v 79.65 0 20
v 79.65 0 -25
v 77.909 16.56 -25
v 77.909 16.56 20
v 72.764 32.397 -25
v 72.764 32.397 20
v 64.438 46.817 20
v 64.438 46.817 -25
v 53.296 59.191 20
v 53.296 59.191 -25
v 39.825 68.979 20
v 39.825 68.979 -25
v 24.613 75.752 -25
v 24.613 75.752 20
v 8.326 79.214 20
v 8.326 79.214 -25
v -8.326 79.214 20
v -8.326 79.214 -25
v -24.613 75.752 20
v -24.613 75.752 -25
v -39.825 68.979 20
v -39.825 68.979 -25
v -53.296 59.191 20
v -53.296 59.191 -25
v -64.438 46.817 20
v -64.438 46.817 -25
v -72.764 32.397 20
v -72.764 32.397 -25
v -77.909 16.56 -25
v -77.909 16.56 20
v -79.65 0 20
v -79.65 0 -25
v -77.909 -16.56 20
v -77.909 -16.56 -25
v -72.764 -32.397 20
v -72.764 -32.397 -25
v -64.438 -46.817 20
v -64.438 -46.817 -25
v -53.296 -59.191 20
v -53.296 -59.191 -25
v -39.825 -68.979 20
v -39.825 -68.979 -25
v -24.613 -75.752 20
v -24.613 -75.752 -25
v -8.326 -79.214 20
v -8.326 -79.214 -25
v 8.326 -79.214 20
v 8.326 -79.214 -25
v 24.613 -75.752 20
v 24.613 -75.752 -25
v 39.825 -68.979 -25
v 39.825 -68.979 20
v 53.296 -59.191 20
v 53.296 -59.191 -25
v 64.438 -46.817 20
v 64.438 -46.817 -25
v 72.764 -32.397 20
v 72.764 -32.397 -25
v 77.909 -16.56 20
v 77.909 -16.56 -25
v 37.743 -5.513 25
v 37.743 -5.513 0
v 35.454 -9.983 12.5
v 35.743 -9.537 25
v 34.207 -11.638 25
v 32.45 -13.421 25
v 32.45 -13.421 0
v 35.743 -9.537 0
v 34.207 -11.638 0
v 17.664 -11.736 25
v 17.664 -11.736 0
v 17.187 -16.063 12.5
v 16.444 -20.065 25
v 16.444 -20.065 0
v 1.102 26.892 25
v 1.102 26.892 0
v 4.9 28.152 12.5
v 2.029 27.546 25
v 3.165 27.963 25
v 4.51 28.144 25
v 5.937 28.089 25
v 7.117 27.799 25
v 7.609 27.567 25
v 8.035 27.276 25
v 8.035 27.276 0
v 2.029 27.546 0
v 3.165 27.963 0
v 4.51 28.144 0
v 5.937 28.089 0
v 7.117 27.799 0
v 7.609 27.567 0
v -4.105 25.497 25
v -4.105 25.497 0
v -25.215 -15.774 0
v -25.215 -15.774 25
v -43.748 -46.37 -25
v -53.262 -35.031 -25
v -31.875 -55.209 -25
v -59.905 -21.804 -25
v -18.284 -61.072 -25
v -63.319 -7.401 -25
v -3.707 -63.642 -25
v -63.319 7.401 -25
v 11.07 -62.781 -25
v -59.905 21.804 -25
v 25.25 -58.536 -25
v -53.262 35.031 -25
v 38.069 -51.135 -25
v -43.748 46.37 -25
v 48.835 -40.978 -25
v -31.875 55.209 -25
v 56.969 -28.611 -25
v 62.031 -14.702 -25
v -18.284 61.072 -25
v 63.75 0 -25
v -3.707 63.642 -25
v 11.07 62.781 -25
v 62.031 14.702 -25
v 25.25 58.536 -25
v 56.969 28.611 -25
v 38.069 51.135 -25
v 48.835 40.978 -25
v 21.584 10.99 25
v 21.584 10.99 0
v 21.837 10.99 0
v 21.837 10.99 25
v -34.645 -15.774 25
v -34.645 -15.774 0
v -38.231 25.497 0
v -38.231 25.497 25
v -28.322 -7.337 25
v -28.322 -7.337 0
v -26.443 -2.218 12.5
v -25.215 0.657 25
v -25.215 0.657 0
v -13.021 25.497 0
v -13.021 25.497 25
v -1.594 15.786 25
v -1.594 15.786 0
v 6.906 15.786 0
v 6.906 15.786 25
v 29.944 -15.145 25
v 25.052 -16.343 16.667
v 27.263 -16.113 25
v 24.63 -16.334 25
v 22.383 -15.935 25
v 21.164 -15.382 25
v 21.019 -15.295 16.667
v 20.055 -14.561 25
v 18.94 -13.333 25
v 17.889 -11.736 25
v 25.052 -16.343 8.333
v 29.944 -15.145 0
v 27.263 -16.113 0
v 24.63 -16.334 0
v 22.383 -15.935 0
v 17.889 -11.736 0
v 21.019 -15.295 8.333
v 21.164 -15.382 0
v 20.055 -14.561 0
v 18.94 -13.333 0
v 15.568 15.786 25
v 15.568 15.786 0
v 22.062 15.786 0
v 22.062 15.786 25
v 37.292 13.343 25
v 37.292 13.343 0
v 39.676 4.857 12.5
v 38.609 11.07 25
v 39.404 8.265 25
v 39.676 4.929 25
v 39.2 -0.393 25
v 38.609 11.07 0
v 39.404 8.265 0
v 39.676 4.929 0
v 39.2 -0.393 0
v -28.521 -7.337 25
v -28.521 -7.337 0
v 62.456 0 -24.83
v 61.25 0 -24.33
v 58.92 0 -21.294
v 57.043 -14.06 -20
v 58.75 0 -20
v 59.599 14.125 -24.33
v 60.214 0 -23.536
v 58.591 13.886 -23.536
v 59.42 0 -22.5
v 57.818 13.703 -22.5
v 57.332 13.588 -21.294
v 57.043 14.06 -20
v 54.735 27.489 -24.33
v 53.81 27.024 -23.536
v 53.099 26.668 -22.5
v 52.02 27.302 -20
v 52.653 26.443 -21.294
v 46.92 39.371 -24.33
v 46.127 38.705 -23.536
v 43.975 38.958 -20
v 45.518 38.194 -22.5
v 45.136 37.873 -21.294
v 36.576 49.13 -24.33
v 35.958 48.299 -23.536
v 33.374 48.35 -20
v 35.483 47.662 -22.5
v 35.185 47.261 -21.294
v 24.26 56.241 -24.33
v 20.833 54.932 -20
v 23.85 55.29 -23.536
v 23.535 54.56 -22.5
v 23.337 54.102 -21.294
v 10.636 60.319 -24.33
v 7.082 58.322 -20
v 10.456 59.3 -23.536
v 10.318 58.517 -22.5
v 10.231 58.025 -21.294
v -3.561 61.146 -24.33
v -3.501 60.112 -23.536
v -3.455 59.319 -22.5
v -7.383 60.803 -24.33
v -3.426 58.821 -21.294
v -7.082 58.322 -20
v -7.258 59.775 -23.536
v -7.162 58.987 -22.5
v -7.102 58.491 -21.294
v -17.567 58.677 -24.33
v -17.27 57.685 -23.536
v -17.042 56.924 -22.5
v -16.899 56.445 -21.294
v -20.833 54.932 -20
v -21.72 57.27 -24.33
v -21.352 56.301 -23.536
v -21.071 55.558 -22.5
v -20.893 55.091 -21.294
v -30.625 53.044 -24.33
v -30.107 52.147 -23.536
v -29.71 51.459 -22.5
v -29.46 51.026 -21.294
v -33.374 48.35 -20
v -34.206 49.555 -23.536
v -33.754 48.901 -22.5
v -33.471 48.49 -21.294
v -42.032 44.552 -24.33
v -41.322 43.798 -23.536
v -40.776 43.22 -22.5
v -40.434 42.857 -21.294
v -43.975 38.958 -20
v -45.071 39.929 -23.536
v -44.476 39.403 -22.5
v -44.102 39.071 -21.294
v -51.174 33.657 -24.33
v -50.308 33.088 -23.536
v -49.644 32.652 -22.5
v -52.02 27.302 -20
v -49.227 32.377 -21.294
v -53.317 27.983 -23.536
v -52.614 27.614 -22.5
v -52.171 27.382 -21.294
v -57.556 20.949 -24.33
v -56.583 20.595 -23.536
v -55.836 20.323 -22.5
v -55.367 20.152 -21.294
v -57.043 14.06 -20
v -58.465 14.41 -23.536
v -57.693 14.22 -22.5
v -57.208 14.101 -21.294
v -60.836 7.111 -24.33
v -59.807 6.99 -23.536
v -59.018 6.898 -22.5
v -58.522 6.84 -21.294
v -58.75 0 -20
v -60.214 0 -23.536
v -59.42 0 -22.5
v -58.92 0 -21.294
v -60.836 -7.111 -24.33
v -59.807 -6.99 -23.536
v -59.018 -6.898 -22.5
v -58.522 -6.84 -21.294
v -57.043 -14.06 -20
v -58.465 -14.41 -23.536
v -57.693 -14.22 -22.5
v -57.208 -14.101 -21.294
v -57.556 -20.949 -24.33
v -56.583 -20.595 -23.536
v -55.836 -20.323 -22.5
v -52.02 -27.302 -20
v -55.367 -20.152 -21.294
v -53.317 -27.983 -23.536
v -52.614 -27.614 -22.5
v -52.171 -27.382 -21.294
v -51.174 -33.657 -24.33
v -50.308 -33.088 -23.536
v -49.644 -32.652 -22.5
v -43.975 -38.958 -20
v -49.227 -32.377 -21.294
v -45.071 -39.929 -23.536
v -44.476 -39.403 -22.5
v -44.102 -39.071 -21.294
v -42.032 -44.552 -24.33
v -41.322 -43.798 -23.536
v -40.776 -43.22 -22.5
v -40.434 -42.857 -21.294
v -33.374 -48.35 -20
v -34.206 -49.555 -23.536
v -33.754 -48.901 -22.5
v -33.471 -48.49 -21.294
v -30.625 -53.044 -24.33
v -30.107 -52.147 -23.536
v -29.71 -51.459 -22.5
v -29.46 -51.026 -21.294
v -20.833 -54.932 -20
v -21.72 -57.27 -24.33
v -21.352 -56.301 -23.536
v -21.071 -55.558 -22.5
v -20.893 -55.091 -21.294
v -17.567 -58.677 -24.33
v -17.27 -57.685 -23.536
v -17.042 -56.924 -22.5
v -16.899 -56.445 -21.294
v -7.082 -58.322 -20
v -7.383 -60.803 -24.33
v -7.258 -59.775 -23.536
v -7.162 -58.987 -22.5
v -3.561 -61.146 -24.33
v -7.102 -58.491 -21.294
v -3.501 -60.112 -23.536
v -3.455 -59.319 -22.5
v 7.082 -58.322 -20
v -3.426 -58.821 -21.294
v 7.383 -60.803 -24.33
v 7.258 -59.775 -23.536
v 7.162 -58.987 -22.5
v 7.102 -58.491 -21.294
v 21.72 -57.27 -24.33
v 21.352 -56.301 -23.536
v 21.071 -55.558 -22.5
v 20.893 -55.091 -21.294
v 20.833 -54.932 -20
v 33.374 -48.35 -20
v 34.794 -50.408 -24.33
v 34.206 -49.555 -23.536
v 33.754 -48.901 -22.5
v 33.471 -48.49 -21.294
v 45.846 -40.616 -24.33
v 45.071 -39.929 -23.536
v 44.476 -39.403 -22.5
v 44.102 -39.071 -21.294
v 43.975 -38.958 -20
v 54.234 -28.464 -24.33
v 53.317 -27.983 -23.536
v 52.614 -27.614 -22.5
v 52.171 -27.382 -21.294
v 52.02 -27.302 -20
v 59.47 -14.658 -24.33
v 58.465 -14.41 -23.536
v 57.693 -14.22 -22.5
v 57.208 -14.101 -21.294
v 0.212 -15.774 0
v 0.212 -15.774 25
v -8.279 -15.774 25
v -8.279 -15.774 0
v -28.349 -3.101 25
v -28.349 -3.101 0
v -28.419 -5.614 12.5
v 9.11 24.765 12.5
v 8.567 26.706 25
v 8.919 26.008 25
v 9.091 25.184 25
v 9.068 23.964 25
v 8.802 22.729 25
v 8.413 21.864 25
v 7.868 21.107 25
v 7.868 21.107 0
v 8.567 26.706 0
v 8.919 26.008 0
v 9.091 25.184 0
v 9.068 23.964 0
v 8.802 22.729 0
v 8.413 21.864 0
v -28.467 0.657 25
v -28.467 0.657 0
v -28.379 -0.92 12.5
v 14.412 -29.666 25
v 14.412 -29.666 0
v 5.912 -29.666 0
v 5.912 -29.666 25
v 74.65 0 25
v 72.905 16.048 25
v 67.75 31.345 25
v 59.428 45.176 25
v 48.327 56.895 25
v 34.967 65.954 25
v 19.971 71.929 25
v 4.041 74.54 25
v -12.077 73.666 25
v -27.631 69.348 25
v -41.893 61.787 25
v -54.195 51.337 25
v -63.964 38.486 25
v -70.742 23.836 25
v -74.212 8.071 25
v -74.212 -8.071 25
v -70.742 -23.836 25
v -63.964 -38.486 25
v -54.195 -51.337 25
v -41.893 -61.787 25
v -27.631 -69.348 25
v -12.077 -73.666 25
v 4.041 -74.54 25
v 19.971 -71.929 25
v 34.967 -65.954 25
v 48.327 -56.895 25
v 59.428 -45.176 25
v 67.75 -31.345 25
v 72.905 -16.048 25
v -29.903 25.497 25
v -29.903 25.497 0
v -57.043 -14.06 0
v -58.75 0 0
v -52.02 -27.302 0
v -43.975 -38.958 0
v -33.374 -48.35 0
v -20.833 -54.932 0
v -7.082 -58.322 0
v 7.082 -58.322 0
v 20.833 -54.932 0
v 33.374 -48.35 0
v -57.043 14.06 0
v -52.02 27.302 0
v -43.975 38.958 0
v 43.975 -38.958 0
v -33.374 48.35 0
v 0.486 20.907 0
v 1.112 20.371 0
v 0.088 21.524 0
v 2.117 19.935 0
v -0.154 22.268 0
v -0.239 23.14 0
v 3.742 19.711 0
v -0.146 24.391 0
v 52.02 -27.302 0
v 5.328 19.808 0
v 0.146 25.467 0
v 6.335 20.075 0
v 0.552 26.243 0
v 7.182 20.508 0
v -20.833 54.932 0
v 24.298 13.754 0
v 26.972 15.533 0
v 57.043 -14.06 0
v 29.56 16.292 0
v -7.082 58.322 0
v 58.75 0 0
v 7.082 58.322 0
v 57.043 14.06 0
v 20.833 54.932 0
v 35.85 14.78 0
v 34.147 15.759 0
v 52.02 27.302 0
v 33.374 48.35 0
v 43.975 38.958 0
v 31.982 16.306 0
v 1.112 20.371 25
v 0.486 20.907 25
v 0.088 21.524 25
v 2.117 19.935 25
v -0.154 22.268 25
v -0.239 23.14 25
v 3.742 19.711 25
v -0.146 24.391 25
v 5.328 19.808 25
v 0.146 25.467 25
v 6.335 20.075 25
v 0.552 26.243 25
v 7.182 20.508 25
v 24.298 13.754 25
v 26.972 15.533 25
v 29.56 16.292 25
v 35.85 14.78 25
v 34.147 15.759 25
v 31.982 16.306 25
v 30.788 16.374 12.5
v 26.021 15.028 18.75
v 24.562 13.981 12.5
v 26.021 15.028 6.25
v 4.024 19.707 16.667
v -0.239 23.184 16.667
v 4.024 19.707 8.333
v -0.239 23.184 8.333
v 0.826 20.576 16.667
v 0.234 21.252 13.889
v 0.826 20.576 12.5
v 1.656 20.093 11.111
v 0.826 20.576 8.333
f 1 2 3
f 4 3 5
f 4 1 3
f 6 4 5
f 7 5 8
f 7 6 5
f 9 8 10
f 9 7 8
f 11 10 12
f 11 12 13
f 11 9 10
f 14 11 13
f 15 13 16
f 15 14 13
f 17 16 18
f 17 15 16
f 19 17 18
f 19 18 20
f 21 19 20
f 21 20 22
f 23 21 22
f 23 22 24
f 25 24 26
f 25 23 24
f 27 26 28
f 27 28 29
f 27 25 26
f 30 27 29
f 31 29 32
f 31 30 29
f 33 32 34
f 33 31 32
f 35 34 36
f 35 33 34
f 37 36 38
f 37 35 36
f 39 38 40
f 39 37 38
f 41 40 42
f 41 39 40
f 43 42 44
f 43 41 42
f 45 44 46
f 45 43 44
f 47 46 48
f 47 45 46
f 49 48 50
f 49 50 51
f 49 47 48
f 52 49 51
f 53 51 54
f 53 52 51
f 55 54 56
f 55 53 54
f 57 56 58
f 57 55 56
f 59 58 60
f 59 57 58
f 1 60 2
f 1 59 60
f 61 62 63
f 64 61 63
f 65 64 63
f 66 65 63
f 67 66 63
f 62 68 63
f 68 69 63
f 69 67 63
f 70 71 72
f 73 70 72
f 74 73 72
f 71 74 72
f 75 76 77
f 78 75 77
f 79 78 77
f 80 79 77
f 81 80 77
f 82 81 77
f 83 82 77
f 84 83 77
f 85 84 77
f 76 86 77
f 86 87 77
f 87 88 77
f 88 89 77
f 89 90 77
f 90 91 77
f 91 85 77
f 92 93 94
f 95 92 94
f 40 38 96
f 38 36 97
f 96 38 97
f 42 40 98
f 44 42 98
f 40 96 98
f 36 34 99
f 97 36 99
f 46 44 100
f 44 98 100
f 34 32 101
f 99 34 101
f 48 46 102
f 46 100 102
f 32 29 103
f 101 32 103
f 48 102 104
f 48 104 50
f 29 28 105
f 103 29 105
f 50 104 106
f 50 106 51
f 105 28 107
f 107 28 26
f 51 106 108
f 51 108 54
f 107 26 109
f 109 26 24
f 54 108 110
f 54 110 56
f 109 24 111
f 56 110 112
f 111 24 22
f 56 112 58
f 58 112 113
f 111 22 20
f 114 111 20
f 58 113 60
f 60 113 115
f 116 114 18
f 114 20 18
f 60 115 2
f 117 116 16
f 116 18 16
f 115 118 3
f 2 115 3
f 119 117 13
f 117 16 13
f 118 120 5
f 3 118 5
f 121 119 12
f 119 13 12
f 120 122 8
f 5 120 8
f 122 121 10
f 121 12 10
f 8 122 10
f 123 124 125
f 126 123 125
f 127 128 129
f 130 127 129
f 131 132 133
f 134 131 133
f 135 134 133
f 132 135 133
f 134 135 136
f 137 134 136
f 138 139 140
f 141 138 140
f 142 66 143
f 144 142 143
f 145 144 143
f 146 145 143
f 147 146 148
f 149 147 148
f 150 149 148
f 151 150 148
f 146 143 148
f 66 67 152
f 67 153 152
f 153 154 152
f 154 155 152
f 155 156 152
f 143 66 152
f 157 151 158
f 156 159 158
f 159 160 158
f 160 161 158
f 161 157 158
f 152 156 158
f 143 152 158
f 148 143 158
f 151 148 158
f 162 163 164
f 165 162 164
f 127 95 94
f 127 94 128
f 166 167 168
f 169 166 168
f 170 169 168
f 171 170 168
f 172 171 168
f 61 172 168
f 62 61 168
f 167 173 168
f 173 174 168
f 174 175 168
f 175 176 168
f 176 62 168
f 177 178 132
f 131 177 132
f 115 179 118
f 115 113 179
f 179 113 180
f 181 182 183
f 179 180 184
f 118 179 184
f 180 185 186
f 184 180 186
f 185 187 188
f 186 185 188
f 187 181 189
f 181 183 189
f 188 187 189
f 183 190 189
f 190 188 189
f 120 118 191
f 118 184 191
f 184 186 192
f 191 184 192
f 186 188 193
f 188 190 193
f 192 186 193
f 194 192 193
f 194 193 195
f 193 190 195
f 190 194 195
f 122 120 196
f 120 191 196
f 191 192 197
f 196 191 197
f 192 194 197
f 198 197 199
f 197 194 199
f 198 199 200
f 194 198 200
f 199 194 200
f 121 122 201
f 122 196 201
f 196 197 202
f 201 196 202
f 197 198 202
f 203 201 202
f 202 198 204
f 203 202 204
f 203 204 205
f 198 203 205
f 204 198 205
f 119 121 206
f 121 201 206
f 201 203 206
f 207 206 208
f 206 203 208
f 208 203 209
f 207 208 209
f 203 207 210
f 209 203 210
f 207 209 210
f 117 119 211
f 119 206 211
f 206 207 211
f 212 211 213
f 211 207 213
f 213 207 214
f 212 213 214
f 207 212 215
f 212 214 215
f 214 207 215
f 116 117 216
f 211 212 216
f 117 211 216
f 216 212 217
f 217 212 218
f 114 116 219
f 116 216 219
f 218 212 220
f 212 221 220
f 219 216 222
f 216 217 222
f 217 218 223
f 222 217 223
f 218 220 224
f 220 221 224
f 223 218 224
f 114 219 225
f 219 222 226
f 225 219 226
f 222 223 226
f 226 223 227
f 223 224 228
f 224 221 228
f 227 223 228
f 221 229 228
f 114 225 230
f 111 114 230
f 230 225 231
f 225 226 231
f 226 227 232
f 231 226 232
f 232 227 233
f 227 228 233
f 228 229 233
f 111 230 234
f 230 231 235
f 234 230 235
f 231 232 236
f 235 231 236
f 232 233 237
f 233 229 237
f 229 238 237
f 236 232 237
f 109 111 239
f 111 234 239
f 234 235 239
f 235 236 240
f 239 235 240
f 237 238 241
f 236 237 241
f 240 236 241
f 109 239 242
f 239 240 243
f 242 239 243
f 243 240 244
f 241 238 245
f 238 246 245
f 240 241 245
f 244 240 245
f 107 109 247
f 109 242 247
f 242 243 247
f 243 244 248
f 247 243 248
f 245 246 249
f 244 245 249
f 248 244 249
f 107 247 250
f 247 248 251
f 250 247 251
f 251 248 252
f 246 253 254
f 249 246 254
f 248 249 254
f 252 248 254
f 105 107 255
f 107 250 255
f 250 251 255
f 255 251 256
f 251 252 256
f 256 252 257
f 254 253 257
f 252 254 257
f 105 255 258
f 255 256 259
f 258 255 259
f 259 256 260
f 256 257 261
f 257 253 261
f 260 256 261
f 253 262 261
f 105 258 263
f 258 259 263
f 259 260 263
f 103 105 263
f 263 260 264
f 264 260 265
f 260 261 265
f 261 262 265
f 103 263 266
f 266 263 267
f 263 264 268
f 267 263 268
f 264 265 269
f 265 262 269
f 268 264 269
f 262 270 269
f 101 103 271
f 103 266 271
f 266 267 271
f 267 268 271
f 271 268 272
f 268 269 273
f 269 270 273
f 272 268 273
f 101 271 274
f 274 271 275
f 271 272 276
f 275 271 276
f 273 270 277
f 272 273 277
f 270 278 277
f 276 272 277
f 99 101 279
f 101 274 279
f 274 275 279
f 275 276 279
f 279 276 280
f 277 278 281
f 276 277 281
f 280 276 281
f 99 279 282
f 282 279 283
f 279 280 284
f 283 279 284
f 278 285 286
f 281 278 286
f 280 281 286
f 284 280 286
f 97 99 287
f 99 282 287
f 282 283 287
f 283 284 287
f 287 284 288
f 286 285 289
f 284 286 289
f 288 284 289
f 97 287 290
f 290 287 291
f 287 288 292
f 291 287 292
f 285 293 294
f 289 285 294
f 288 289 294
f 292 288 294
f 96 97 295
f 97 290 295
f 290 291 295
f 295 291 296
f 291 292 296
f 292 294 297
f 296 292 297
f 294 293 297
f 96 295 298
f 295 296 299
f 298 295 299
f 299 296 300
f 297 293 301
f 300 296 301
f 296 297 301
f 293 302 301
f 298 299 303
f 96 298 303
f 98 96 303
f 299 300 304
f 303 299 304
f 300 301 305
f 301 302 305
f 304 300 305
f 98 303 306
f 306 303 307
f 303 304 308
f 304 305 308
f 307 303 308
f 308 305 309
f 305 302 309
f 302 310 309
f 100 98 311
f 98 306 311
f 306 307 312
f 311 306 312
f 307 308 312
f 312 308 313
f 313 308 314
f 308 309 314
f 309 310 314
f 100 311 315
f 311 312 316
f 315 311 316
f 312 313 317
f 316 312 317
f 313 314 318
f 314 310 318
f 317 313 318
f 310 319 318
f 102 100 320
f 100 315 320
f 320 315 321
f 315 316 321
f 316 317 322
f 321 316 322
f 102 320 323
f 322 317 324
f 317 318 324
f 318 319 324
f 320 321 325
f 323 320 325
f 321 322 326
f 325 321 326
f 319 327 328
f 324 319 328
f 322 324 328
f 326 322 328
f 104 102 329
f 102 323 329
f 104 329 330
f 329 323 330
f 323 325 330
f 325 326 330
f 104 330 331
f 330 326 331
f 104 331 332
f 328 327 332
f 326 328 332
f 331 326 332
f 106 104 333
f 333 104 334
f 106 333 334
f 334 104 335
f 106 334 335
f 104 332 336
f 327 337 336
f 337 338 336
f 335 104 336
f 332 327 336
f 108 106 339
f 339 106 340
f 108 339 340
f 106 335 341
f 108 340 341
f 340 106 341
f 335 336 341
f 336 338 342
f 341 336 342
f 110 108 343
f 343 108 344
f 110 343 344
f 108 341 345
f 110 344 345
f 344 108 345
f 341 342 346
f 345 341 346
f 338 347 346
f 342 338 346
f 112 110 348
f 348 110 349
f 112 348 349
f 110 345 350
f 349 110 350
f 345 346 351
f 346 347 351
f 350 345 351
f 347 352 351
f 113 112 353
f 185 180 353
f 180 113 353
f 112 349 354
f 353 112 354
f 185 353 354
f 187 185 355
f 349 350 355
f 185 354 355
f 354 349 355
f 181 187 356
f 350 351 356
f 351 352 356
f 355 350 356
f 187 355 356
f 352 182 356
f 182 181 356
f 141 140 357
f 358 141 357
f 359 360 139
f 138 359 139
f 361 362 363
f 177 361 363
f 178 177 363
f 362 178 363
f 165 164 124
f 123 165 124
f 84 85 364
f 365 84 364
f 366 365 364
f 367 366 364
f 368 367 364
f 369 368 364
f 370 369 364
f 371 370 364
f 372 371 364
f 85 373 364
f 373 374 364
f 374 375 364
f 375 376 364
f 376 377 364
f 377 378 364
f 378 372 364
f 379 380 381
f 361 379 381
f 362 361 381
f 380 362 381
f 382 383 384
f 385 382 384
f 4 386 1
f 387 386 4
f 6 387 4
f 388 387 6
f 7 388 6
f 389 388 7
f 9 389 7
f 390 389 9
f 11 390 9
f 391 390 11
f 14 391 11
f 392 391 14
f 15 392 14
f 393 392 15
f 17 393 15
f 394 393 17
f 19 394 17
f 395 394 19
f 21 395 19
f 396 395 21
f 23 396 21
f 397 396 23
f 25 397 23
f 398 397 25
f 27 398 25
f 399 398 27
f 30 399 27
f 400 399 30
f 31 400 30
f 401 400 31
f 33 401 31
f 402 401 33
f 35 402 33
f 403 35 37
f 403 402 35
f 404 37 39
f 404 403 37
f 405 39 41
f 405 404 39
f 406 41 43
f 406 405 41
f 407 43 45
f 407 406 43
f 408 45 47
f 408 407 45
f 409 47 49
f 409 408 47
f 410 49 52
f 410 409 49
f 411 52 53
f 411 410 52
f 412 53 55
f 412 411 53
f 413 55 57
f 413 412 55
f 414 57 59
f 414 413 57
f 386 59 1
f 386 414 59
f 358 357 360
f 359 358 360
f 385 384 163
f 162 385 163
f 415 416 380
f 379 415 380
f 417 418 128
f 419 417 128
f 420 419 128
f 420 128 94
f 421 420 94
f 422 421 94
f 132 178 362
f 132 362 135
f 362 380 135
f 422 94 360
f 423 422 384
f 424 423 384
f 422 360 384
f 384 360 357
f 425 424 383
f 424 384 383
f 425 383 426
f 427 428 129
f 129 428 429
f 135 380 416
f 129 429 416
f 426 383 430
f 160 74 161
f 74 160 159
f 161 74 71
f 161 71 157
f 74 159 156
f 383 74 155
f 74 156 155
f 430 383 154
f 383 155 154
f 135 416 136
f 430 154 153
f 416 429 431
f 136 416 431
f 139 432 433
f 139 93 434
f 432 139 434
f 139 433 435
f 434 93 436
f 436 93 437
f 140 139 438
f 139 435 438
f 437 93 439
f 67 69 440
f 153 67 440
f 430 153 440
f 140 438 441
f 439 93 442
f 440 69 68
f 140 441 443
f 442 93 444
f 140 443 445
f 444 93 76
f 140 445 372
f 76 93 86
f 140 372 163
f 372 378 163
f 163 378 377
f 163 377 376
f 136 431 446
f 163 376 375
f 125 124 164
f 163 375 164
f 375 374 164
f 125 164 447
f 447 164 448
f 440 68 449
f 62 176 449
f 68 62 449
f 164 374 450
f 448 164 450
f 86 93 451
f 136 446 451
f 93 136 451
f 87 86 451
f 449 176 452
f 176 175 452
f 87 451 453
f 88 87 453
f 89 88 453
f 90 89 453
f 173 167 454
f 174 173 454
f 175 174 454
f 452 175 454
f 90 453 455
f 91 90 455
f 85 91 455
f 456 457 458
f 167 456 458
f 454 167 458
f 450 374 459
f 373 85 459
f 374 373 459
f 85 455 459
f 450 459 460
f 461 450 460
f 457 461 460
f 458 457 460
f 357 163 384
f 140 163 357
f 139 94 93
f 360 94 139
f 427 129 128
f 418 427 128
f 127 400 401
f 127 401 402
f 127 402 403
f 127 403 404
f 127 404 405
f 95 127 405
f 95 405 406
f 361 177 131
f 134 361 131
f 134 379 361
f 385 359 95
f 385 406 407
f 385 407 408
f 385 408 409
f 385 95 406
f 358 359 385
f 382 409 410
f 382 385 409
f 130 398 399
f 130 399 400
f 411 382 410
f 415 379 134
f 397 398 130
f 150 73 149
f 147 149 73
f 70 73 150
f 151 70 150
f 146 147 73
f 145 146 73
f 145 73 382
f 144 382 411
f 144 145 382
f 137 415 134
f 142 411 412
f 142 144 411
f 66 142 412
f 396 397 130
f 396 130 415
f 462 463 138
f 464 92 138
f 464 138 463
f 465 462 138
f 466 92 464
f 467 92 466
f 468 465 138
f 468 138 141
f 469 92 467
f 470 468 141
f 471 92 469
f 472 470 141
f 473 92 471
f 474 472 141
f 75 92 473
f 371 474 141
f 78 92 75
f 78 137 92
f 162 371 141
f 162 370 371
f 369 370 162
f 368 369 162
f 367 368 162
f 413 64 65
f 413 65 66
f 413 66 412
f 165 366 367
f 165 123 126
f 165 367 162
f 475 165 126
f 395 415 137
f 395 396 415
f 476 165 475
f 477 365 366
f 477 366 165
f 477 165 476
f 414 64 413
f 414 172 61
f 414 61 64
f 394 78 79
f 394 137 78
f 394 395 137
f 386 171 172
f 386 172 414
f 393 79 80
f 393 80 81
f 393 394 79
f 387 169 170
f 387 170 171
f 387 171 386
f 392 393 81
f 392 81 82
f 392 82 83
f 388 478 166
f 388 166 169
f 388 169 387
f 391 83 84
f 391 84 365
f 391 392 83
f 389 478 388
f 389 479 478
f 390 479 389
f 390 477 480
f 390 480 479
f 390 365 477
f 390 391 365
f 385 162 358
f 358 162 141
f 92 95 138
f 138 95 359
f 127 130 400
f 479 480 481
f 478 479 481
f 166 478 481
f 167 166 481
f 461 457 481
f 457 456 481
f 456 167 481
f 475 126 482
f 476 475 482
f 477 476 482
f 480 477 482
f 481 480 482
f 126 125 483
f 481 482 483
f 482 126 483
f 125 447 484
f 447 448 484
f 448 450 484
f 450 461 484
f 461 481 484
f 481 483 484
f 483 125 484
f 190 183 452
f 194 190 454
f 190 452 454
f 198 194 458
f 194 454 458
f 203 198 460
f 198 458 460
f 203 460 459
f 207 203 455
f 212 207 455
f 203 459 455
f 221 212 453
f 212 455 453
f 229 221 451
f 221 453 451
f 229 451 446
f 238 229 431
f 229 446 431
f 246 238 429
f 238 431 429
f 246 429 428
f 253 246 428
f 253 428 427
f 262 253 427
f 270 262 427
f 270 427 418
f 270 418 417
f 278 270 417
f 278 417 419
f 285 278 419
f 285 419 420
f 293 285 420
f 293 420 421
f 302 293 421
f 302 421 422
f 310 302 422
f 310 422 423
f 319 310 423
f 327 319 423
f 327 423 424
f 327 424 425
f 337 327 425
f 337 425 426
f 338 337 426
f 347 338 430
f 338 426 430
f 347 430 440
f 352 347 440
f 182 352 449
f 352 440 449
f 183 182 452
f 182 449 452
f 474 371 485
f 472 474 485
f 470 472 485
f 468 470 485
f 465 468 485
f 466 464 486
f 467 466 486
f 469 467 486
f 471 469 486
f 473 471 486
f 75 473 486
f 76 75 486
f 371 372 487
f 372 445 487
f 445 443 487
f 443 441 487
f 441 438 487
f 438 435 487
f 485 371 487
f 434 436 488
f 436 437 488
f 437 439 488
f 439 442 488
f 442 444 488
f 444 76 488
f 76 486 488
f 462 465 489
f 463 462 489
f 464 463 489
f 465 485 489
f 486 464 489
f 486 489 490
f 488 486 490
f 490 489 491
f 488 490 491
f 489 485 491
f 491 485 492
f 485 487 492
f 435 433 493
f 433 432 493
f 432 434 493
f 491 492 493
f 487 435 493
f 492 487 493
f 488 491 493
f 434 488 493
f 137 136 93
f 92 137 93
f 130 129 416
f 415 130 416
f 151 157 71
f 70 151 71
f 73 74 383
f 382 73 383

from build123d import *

# Parameters (mm, degrees)
F1_DEPTH = 25
F2_R     = 79.6498805285
F2_R_2   = 58.7498805617
F3_DEPTH = 50
F4_SIZE  = 5
F5_R     = 5


with BuildPart() as f1:
    # F0 (on Top) → F1 (new body)
    with BuildSketch(Plane.XY):
        with BuildLine():
            ThreePointArc((-58.7498805617, 0), (0, -58.7498805617), (58.7498805617, 0))
            ThreePointArc((58.7498805617, 0), (0, 58.7498805617), (-58.7498805617, 0))
        make_face()
        with BuildLine():
            Line((-28.5208848633, -7.3374048471), (-28.3221645254, -7.3374048471))
            add(Edge.make_bspline(
                [(-28.3221645254, -7.3374048471), (-26.118175323, -1.0957796878), (-25.2149010597, 0.656572383)],
                knots=[0, 0, 0, 1, 1, 1], degree=2))
            Line((-25.2149010597, 0.656572383), (-13.0206985053, 25.4966146234))
            Line((-13.0206985053, 25.4966146234), (-4.1053815266, 25.4966146234))
            Line((-4.1053815266, 25.4966146234), (-25.2149010597, -15.7739864662))
            Line((-25.2149010597, -15.7739864662), (-34.6450843684, -15.7739864662))
            Line((-34.6450843684, -15.7739864662), (-38.2310831936, 25.4966146234))
            Line((-38.2310831936, 25.4966146234), (-29.9028944861, 25.4966146234))
            Line((-29.9028944861, 25.4966146234), (-28.4666884075, 0.656572383))
            add(Edge.make_bspline(
                [(-28.4666884075, 0.656572383), (-28.3492627533, -0.6170443283), (-28.3492627533, -3.1010485523)],
                knots=[0, 0, 0, 1, 1, 1], degree=2))
            add(Edge.make_bspline(
                [(-28.3492627533, -3.1010485523), (-28.4034592091, -6.0095916801), (-28.5208848633, -7.3374048471)],
                knots=[0, 0, 0, 1, 1, 1], degree=2))
        make_face(mode=Mode.SUBTRACT)
        Polygon((6.9055317428, 15.786416293), (0.2122694519, -15.7739864662), (-8.278508623, -15.7739864662), (-1.5942790747, 15.786416293), align=None, mode=Mode.SUBTRACT)
        with BuildLine():
            add(Edge.make_bspline(
                [(21.836655315, 10.990029955), (25.7297673897, 16.3735445642), (30.7881032642, 16.3735445642)],
                knots=[0, 0, 0, 1, 1, 1], degree=2))
            add(Edge.make_bspline(
                [(30.7881032642, 16.3735445642), (34.9070339048, 16.3735445642), (37.2916779598, 13.3430594108)],
                knots=[0, 0, 0, 1, 1, 1], degree=2))
            add(Edge.make_bspline(
                [(37.2916779598, 13.3430594108), (39.6763220149, 10.3125742575), (39.6763220149, 4.8567977073)],
                knots=[0, 0, 0, 1, 1, 1], degree=2))
            add(Edge.make_bspline(
                [(39.6763220149, 4.8567977073), (39.6763220149, -0.5267169019), (37.7433150915, -5.5127908353)],
                knots=[0, 0, 0, 1, 1, 1], degree=2))
            add(Edge.make_bspline(
                [(37.7433150915, -5.5127908353), (35.810308168, -10.4988647686), (32.4501279086, -13.4209570104)],
                knots=[0, 0, 0, 1, 1, 1], degree=2))
            add(Edge.make_bspline(
                [(32.4501279086, -13.4209570104), (29.0899476492, -16.3430492521), (25.0523116923, -16.3430492521)],
                knots=[0, 0, 0, 1, 1, 1], degree=2))
            add(Edge.make_bspline(
                [(25.0523116923, -16.3430492521), (22.7128313504, -16.3430492521), (21.0191921067, -15.2952511067)],
                knots=[0, 0, 0, 1, 1, 1], degree=2))
            add(Edge.make_bspline(
                [(21.0191921067, -15.2952511067), (19.325552863, -14.2474529613), (17.8893467844, -11.7363505093)],
                knots=[0, 0, 0, 1, 1, 1], degree=2))
            Line((17.8893467844, -11.7363505093), (17.6635282186, -11.7363505093))
            add(Edge.make_bspline(
                [(17.6635282186, -11.7363505093), (17.3202839985, -16.2256235979), (16.4441079632, -20.0645392168)],
                knots=[0, 0, 0, 1, 1, 1], degree=2))
            Line((16.4441079632, -20.0645392168), (14.4117408708, -29.6663446356))
            Line((14.4117408708, -29.6663446356), (5.9119300532, -29.6663446356))
            Line((5.9119300532, -29.6663446356), (15.5679319278, 15.786416293))
            Line((15.5679319278, 15.786416293), (22.0624738808, 15.786416293))
            Line((22.0624738808, 15.786416293), (21.5837385213, 10.990029955))
            Line((21.5837385213, 10.990029955), (21.836655315, 10.990029955))
        make_face(mode=Mode.SUBTRACT)
        with BuildLine():
            add(Edge.make_bspline(
                [(4.0240868429, 19.7066265957), (-0.2393676798, 19.7066265957), (-0.2393676798, 23.1842325094)],
                knots=[0, 0, 0, 1, 1, 1], degree=2))
            add(Edge.make_bspline(
                [(-0.2393676798, 23.1842325094), (-0.2393676798, 25.6321057629), (1.1019946012, 26.8921733602)],
                knots=[0, 0, 0, 1, 1, 1], degree=2))
            add(Edge.make_bspline(
                [(1.1019946012, 26.8921733602), (2.4433568822, 28.1522409574), (4.9002628783, 28.1522409574)],
                knots=[0, 0, 0, 1, 1, 1], degree=2))
            add(Edge.make_bspline(
                [(4.9002628783, 28.1522409574), (6.9597281986, 28.1522409574), (8.0346245719, 27.2760649221)],
                knots=[0, 0, 0, 1, 1, 1], degree=2))
            add(Edge.make_bspline(
                [(8.0346245719, 27.2760649221), (9.1095209453, 26.3998888867), (9.1095209453, 24.7649624701)],
                knots=[0, 0, 0, 1, 1, 1], degree=2))
            add(Edge.make_bspline(
                [(9.1095209453, 24.7649624701), (9.1095209453, 22.5067768119), (7.8675188332, 21.1067017038)],
                knots=[0, 0, 0, 1, 1, 1], degree=2))
            add(Edge.make_bspline(
                [(7.8675188332, 21.1067017038), (6.6255167212, 19.7066265957), (4.0240868429, 19.7066265957)],
                knots=[0, 0, 0, 1, 1, 1], degree=2))
        make_face(mode=Mode.SUBTRACT)
    extrude(amount=F1_DEPTH)

    # F2 (on face) → F3 (join)
    with BuildSketch(Plane.XY.offset(25)):
        Circle(F2_R)
        Circle(F2_R_2, mode=Mode.SUBTRACT)
    extrude(amount=-F3_DEPTH)

    # F4
    f4_edges = [f1.edges().sort_by_distance(p)[0] for p in [
        (-79.649881, 0, 25),
    ]]
    chamfer(f4_edges, length=F4_SIZE)

    # F5
    f5_edges = [f1.edges().sort_by_distance(p)[0] for p in [
        (-58.749881, 0, -25),
    ]]
    fillet(f5_edges, radius=F5_R)


solid = f1.part
